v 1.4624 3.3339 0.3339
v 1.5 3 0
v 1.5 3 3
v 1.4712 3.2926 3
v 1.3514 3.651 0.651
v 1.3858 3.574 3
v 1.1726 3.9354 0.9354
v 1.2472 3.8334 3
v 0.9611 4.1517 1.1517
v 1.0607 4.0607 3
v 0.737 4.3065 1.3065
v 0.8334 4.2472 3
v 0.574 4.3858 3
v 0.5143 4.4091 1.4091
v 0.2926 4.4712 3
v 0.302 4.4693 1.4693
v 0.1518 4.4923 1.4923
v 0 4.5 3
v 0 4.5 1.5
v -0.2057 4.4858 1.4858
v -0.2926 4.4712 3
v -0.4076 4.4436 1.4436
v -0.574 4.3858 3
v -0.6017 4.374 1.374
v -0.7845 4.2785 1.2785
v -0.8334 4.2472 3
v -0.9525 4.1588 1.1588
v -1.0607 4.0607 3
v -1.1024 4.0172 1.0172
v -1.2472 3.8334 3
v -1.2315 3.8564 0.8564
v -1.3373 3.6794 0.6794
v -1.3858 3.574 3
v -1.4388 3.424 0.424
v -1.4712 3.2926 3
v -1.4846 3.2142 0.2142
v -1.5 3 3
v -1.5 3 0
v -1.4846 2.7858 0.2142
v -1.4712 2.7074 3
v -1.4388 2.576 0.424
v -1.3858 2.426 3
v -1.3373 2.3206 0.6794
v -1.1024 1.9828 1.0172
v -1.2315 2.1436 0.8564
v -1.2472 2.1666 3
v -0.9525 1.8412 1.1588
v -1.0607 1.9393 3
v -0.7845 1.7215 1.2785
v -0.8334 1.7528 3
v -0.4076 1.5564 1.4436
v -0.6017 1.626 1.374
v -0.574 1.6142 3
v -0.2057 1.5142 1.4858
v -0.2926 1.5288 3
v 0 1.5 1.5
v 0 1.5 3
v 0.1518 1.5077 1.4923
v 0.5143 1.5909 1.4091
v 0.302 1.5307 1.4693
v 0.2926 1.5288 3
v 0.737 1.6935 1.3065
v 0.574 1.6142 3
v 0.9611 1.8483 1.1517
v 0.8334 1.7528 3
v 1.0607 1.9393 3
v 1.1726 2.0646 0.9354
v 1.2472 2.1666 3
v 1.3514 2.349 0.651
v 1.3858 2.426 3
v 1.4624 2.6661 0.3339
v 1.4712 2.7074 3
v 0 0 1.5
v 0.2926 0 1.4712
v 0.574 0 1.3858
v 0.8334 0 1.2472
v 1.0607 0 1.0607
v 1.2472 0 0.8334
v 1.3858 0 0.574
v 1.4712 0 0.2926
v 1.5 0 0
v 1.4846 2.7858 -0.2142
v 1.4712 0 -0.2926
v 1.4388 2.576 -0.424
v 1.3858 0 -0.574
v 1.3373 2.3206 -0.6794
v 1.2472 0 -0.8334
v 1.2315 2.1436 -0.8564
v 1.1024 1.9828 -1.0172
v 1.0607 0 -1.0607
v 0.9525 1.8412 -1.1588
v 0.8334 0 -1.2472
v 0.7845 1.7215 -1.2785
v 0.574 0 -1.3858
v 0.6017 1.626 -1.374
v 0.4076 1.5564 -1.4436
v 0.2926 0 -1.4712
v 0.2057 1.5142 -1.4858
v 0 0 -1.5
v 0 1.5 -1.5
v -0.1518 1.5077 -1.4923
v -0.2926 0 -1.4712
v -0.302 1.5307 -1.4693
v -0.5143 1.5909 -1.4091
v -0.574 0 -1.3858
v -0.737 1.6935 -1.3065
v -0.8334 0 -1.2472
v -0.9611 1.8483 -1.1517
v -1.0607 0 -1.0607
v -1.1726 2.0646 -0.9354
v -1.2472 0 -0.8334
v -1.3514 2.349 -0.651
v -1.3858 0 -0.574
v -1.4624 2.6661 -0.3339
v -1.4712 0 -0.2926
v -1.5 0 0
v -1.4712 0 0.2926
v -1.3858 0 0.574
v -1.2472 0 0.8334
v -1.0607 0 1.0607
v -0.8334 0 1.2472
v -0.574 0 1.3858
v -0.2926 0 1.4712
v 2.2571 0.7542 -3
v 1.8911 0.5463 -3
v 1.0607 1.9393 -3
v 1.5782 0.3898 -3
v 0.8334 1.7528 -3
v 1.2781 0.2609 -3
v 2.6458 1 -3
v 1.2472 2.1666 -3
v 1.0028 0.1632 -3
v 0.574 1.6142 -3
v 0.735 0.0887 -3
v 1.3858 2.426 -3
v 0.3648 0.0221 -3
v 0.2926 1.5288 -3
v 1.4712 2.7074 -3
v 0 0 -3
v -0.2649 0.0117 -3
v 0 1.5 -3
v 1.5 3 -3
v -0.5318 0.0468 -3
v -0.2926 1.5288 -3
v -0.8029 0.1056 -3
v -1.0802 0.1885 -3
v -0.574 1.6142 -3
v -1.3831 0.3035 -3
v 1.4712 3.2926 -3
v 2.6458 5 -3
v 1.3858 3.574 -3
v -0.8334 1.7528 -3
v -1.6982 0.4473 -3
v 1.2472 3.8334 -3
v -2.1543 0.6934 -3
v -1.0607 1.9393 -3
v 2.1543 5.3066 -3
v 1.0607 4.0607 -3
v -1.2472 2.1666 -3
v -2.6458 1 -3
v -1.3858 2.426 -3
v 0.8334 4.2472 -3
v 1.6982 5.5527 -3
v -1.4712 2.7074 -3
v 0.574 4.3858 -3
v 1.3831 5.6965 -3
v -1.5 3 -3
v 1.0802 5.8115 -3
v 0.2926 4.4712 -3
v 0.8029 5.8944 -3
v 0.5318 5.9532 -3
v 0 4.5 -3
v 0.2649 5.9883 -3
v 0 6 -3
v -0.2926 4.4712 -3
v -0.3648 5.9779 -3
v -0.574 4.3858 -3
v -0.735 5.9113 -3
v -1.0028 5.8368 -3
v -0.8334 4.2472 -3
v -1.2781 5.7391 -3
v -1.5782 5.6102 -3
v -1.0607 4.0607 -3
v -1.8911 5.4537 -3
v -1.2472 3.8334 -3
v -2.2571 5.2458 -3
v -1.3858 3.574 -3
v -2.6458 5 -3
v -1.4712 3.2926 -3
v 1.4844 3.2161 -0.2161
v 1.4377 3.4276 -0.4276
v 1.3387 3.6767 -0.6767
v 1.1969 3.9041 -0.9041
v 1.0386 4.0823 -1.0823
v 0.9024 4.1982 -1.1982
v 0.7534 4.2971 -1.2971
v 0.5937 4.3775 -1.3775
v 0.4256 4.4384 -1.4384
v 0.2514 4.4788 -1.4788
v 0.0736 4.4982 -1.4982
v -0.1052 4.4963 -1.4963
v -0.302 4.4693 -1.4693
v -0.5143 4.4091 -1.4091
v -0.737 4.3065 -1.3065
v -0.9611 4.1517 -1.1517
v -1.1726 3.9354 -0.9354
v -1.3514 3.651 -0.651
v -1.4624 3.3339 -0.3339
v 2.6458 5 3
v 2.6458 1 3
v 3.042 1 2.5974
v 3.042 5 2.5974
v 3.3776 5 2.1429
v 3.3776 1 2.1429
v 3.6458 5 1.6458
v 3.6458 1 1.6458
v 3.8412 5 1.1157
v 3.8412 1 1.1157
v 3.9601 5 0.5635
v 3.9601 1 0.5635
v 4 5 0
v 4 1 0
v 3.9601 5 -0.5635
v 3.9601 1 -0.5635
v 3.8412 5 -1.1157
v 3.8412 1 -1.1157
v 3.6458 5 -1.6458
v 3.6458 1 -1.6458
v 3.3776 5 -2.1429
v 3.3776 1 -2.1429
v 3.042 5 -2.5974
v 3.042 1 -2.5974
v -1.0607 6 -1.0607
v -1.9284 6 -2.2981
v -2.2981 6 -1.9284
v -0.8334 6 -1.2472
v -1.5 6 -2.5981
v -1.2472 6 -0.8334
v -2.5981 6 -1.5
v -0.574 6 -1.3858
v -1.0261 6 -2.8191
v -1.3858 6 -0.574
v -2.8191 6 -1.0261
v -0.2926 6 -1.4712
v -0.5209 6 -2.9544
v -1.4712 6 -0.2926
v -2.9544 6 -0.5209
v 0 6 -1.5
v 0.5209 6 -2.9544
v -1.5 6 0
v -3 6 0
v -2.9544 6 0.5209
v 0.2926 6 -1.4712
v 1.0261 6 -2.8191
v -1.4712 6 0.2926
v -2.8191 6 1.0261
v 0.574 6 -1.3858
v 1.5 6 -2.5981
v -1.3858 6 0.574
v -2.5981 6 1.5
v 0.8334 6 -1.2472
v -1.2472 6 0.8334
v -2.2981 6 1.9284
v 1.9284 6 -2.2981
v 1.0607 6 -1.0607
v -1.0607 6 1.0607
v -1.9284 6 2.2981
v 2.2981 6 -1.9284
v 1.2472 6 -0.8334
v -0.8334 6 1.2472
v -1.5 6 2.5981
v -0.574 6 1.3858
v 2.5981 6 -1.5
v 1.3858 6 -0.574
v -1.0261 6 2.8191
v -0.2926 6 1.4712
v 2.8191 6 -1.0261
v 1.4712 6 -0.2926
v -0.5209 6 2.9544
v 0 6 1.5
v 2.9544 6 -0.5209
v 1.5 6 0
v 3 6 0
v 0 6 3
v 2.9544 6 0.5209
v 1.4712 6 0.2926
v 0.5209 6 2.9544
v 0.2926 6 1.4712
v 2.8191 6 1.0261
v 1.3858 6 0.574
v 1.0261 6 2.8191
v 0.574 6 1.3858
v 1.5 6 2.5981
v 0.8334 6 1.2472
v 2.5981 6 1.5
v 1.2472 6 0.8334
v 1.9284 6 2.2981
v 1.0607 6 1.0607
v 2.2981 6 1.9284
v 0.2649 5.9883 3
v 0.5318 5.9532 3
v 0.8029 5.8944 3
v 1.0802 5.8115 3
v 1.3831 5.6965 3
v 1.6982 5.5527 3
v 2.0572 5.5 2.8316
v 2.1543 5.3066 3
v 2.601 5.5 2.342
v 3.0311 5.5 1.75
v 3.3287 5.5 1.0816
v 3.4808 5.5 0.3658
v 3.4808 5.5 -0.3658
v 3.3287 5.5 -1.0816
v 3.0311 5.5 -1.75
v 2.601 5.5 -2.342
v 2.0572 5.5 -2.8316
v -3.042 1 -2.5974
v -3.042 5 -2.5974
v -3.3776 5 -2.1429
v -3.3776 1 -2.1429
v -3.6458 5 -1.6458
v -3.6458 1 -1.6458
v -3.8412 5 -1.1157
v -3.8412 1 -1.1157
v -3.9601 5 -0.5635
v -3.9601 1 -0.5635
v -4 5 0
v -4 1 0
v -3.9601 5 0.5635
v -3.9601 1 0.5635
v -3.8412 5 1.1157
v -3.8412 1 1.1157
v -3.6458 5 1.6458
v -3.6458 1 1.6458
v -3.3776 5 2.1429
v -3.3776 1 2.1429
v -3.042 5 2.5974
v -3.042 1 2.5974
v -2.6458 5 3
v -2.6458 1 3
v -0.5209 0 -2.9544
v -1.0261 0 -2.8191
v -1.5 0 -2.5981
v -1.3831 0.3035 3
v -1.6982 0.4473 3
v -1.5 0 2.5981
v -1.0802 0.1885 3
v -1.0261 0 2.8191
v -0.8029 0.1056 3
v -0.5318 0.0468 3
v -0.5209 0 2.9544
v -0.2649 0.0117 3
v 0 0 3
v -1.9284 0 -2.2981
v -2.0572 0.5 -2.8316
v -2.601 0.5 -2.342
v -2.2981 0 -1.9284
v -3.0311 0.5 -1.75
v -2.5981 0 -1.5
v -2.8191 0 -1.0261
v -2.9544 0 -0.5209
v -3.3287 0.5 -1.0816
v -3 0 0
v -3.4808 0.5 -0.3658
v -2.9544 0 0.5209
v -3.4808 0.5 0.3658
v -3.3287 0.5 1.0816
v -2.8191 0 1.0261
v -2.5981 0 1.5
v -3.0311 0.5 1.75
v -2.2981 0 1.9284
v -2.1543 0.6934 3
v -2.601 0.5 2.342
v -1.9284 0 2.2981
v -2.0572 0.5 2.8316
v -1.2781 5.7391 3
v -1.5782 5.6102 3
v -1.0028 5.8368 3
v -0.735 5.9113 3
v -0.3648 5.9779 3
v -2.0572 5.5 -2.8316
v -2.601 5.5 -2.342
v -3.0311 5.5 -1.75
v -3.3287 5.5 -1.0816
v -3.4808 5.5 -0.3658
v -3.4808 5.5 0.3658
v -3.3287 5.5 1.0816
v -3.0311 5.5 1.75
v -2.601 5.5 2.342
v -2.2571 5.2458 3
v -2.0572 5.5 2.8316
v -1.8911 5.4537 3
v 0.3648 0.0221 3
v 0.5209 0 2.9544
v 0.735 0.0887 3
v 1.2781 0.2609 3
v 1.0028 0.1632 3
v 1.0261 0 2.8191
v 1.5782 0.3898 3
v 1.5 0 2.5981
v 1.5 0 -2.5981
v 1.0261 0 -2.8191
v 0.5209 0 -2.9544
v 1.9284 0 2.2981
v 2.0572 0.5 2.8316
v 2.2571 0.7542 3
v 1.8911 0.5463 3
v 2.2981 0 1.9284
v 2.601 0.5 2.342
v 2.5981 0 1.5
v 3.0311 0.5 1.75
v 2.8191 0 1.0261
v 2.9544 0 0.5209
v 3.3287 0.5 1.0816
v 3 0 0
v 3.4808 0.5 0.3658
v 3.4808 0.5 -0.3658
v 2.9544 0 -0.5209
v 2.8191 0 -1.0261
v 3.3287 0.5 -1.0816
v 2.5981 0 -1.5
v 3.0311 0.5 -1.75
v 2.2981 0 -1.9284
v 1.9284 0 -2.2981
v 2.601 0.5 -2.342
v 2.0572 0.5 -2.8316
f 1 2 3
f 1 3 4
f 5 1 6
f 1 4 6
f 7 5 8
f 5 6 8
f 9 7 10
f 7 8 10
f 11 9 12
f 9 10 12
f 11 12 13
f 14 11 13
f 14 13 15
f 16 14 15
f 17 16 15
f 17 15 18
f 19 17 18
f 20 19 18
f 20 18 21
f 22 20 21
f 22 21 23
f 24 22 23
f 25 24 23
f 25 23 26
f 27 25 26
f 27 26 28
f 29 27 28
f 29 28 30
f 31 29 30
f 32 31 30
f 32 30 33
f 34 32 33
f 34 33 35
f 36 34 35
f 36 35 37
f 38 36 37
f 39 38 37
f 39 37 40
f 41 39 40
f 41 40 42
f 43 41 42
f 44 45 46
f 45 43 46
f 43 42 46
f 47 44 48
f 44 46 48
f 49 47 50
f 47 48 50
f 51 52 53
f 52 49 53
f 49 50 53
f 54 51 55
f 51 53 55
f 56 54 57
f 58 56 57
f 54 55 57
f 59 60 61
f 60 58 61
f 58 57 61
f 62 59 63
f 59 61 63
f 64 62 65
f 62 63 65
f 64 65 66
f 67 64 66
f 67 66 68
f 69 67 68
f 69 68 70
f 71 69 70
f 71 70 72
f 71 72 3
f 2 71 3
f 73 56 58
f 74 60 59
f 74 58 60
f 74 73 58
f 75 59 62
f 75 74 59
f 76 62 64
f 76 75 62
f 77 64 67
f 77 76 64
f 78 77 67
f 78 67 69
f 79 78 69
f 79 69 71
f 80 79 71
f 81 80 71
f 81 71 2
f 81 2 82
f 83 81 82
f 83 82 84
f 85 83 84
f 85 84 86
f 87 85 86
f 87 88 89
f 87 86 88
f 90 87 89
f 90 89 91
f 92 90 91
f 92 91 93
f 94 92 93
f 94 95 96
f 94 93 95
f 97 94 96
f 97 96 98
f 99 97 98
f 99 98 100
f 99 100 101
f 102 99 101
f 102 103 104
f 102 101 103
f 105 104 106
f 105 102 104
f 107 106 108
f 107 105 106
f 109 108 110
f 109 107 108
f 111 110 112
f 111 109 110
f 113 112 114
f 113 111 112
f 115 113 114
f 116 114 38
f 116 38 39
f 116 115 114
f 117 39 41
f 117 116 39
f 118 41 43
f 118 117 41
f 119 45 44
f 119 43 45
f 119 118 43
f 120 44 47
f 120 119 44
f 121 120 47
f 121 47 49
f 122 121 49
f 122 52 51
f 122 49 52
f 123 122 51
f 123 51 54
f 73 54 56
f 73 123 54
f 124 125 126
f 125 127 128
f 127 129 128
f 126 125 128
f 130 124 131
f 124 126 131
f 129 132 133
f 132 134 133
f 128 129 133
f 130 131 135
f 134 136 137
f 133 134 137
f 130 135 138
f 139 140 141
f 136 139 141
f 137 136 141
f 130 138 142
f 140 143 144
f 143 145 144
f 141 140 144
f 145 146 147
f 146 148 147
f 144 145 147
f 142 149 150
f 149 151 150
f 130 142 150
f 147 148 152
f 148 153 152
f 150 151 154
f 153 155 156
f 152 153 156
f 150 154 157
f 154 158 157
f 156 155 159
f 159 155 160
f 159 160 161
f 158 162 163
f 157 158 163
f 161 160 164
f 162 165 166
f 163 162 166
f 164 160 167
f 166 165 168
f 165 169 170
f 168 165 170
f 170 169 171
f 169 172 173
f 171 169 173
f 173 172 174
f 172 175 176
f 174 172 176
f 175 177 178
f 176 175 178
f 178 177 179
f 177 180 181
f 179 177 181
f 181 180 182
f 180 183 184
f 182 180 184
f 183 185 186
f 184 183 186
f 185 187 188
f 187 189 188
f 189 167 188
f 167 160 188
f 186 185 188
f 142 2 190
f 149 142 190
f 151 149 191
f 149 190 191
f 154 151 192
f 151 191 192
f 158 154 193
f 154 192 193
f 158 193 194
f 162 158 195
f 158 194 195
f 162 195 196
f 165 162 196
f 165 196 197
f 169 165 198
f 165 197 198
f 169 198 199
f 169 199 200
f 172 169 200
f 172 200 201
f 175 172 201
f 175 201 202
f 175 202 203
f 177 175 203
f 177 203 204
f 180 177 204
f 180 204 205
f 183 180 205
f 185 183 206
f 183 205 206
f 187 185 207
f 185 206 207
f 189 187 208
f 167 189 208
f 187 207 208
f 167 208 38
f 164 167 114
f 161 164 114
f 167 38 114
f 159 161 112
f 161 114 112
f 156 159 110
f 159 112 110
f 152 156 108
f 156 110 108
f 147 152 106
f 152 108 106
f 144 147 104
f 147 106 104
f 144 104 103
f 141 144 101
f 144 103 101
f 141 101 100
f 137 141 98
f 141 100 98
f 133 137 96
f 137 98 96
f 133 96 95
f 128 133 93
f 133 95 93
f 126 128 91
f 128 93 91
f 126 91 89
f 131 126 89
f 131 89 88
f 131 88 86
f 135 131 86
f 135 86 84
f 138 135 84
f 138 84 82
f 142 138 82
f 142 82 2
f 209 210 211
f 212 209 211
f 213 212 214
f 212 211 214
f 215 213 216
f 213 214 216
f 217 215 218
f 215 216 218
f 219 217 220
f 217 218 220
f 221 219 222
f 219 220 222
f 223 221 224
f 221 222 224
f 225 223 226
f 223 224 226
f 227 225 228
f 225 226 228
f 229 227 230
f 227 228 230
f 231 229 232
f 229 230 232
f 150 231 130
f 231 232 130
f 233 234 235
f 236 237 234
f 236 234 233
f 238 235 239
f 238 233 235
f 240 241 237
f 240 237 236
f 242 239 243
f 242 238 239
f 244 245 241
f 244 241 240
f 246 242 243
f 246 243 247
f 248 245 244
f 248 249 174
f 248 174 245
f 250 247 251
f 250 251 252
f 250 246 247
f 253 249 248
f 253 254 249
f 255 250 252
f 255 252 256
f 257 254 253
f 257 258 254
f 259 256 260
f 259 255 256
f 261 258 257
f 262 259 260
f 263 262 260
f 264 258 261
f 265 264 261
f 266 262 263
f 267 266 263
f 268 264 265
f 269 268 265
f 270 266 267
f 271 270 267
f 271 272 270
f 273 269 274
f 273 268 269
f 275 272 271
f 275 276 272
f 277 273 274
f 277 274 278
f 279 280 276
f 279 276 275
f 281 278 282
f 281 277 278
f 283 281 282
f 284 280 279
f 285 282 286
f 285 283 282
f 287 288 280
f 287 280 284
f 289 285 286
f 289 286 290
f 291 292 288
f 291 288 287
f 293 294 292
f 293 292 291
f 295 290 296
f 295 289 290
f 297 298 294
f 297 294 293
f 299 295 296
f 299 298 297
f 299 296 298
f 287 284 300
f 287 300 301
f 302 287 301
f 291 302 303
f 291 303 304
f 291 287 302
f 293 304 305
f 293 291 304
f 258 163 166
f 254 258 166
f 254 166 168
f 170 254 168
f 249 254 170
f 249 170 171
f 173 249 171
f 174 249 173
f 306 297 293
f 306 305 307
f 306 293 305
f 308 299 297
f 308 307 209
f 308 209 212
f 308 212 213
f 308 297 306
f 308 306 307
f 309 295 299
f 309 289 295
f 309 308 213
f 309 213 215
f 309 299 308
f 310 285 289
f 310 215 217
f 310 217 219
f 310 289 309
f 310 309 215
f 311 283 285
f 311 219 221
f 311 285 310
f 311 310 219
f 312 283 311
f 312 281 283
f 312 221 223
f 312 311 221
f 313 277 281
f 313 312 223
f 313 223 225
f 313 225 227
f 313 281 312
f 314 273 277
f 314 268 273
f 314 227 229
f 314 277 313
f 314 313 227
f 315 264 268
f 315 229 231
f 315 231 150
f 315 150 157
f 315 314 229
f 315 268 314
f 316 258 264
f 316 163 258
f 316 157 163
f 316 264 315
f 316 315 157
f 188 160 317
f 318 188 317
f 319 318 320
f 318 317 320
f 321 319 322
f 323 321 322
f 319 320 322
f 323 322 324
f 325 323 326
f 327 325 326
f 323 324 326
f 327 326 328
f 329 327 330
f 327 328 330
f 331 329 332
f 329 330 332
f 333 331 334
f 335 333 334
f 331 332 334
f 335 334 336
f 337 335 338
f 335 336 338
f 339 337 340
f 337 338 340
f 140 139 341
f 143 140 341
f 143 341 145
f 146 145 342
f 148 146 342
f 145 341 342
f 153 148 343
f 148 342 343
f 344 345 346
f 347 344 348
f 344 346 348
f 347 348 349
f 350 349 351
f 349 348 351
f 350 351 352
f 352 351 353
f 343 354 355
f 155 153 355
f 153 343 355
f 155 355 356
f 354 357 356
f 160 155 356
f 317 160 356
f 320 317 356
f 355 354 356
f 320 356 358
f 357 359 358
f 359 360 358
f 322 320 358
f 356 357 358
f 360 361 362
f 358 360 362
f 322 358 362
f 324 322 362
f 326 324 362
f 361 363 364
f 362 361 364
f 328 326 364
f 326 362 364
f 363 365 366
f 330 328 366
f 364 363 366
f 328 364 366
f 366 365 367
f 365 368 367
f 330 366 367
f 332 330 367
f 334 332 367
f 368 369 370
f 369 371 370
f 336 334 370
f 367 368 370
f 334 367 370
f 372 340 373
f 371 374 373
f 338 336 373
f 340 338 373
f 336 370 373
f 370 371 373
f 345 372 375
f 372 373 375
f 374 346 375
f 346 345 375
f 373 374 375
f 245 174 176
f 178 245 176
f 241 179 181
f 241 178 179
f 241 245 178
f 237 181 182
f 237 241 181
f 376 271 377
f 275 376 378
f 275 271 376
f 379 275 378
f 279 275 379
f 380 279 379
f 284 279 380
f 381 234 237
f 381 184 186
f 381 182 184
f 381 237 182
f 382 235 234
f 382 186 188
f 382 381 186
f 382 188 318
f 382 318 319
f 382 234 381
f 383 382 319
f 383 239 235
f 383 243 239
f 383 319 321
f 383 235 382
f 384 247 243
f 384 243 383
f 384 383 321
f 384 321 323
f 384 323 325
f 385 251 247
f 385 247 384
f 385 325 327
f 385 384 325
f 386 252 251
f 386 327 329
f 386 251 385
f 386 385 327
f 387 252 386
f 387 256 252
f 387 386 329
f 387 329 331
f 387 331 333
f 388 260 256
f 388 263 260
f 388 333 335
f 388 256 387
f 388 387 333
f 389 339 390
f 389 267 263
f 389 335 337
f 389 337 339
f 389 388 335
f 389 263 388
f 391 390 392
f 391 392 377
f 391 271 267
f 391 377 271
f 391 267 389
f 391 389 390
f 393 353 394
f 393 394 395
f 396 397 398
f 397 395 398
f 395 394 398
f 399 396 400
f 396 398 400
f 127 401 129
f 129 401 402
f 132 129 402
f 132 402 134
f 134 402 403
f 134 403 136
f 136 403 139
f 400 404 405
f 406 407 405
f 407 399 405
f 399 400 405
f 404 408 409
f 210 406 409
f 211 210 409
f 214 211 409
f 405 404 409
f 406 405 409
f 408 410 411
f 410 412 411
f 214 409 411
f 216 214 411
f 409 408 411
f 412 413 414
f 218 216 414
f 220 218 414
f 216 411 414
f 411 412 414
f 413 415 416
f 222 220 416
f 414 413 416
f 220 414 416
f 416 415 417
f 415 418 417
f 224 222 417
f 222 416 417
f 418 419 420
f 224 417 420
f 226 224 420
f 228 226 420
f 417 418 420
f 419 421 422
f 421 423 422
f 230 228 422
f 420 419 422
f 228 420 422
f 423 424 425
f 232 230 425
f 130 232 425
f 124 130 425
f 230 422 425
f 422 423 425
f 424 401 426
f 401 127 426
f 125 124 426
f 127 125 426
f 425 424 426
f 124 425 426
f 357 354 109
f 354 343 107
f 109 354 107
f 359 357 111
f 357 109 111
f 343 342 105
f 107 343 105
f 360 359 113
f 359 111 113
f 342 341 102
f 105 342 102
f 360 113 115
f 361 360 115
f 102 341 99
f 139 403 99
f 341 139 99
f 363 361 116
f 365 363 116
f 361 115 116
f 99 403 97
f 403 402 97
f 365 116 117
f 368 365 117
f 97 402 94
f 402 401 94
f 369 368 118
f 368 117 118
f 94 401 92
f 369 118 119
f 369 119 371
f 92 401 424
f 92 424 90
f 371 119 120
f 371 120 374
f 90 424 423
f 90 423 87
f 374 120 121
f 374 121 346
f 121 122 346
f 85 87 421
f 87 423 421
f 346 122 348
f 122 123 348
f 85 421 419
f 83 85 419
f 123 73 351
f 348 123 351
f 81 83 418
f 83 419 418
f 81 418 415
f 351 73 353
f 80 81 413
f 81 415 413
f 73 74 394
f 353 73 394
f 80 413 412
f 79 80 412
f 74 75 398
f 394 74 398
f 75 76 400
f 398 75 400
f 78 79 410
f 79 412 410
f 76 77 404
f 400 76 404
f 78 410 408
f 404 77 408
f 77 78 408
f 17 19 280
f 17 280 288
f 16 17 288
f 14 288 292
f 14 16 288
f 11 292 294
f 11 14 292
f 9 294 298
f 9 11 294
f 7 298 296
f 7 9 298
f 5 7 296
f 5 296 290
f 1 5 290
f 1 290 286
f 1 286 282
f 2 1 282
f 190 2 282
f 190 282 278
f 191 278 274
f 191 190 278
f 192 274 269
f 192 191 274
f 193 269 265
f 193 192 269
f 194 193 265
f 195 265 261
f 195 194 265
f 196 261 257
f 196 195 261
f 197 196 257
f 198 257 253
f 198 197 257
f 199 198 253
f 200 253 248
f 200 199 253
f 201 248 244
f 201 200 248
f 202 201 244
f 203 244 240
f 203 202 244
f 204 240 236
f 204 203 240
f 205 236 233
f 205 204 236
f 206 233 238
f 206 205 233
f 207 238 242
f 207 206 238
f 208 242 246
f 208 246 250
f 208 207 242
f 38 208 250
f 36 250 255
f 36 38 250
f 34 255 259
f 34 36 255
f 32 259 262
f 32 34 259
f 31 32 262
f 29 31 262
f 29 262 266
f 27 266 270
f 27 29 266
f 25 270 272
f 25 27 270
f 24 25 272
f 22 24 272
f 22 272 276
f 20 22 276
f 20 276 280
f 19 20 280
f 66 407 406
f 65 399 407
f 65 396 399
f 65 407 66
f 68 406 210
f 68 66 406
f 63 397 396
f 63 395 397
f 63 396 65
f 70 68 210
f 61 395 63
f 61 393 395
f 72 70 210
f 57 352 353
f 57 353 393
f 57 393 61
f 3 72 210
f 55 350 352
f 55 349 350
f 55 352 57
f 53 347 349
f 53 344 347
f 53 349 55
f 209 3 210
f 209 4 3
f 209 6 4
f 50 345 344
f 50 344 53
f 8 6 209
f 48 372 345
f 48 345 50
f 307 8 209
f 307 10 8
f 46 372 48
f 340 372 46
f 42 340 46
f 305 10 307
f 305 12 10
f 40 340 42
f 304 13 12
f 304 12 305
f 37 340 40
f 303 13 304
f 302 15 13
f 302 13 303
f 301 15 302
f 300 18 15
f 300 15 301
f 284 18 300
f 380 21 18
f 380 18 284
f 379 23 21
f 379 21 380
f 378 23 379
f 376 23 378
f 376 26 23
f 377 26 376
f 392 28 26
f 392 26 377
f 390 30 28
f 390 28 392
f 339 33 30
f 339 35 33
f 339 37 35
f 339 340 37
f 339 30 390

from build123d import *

# Parameters (mm, degrees)
CROQUIS1_R                 = 4
CROQUIS1_R_2               = 1.5
SALIENTE_EXTRUIR3_DEPTH    = 6
CHAFL_N1_SIZE              = 1
CHAFL_N2_SIZE              = 1
CORTAR_EXTRUIR2_DEPTH      = 4
CORTAR_EXTRUIR2_DEPTH_BACK = 4
CROQUIS3_W                 = 2
CROQUIS3_H                 = 6
CROQUIS4_R                 = 1.5
CORTAR_EXTRUIR3_DEPTH      = 6


with BuildPart() as part:
    # Croquis1 → Saliente-Extruir3 (new body)
    with BuildSketch(Plane(origin=(0, 0, 0), x_dir=(1, 0, 0), z_dir=(0, 1, 0))):
        Circle(CROQUIS1_R)
        Circle(CROQUIS1_R_2, mode=Mode.SUBTRACT)
    extrude(amount=SALIENTE_EXTRUIR3_DEPTH)

    # Chaflán1
    chafl_n1_edges = [part.edges().sort_by_distance(p)[0] for p in [
        (-4, 6, 0),
    ]]
    chamfer(chafl_n1_edges, length=CHAFL_N1_SIZE)

    # Chaflán2
    chafl_n2_edges = [part.edges().sort_by_distance(p)[0] for p in [
        (-4, 0, 0),
    ]]
    chamfer(chafl_n2_edges, length=CHAFL_N2_SIZE)

    # Croquis3 → Cortar-Extruir2 (cut, two sides: drawn at the far end of the back side and taken through both)
    with BuildSketch(Plane(origin=(0, 0, 0), x_dir=(0, 0, -1), z_dir=(1, 0, 0)).offset(-CORTAR_EXTRUIR2_DEPTH_BACK)):
        with Locations((-4, 3)):
            Rectangle(CROQUIS3_W, CROQUIS3_H)
        with Locations((4, 3)):
            Rectangle(CROQUIS3_W, CROQUIS3_H)
    extrude(amount=CORTAR_EXTRUIR2_DEPTH + CORTAR_EXTRUIR2_DEPTH_BACK, mode=Mode.SUBTRACT)

    # Croquis4 → Cortar-Extruir3 (cut)
    with BuildSketch(Plane.XY.offset(3)):
        with Locations((0, 3)):
            Circle(CROQUIS4_R)
    extrude(amount=-CORTAR_EXTRUIR3_DEPTH, mode=Mode.SUBTRACT)


solid = part.part
